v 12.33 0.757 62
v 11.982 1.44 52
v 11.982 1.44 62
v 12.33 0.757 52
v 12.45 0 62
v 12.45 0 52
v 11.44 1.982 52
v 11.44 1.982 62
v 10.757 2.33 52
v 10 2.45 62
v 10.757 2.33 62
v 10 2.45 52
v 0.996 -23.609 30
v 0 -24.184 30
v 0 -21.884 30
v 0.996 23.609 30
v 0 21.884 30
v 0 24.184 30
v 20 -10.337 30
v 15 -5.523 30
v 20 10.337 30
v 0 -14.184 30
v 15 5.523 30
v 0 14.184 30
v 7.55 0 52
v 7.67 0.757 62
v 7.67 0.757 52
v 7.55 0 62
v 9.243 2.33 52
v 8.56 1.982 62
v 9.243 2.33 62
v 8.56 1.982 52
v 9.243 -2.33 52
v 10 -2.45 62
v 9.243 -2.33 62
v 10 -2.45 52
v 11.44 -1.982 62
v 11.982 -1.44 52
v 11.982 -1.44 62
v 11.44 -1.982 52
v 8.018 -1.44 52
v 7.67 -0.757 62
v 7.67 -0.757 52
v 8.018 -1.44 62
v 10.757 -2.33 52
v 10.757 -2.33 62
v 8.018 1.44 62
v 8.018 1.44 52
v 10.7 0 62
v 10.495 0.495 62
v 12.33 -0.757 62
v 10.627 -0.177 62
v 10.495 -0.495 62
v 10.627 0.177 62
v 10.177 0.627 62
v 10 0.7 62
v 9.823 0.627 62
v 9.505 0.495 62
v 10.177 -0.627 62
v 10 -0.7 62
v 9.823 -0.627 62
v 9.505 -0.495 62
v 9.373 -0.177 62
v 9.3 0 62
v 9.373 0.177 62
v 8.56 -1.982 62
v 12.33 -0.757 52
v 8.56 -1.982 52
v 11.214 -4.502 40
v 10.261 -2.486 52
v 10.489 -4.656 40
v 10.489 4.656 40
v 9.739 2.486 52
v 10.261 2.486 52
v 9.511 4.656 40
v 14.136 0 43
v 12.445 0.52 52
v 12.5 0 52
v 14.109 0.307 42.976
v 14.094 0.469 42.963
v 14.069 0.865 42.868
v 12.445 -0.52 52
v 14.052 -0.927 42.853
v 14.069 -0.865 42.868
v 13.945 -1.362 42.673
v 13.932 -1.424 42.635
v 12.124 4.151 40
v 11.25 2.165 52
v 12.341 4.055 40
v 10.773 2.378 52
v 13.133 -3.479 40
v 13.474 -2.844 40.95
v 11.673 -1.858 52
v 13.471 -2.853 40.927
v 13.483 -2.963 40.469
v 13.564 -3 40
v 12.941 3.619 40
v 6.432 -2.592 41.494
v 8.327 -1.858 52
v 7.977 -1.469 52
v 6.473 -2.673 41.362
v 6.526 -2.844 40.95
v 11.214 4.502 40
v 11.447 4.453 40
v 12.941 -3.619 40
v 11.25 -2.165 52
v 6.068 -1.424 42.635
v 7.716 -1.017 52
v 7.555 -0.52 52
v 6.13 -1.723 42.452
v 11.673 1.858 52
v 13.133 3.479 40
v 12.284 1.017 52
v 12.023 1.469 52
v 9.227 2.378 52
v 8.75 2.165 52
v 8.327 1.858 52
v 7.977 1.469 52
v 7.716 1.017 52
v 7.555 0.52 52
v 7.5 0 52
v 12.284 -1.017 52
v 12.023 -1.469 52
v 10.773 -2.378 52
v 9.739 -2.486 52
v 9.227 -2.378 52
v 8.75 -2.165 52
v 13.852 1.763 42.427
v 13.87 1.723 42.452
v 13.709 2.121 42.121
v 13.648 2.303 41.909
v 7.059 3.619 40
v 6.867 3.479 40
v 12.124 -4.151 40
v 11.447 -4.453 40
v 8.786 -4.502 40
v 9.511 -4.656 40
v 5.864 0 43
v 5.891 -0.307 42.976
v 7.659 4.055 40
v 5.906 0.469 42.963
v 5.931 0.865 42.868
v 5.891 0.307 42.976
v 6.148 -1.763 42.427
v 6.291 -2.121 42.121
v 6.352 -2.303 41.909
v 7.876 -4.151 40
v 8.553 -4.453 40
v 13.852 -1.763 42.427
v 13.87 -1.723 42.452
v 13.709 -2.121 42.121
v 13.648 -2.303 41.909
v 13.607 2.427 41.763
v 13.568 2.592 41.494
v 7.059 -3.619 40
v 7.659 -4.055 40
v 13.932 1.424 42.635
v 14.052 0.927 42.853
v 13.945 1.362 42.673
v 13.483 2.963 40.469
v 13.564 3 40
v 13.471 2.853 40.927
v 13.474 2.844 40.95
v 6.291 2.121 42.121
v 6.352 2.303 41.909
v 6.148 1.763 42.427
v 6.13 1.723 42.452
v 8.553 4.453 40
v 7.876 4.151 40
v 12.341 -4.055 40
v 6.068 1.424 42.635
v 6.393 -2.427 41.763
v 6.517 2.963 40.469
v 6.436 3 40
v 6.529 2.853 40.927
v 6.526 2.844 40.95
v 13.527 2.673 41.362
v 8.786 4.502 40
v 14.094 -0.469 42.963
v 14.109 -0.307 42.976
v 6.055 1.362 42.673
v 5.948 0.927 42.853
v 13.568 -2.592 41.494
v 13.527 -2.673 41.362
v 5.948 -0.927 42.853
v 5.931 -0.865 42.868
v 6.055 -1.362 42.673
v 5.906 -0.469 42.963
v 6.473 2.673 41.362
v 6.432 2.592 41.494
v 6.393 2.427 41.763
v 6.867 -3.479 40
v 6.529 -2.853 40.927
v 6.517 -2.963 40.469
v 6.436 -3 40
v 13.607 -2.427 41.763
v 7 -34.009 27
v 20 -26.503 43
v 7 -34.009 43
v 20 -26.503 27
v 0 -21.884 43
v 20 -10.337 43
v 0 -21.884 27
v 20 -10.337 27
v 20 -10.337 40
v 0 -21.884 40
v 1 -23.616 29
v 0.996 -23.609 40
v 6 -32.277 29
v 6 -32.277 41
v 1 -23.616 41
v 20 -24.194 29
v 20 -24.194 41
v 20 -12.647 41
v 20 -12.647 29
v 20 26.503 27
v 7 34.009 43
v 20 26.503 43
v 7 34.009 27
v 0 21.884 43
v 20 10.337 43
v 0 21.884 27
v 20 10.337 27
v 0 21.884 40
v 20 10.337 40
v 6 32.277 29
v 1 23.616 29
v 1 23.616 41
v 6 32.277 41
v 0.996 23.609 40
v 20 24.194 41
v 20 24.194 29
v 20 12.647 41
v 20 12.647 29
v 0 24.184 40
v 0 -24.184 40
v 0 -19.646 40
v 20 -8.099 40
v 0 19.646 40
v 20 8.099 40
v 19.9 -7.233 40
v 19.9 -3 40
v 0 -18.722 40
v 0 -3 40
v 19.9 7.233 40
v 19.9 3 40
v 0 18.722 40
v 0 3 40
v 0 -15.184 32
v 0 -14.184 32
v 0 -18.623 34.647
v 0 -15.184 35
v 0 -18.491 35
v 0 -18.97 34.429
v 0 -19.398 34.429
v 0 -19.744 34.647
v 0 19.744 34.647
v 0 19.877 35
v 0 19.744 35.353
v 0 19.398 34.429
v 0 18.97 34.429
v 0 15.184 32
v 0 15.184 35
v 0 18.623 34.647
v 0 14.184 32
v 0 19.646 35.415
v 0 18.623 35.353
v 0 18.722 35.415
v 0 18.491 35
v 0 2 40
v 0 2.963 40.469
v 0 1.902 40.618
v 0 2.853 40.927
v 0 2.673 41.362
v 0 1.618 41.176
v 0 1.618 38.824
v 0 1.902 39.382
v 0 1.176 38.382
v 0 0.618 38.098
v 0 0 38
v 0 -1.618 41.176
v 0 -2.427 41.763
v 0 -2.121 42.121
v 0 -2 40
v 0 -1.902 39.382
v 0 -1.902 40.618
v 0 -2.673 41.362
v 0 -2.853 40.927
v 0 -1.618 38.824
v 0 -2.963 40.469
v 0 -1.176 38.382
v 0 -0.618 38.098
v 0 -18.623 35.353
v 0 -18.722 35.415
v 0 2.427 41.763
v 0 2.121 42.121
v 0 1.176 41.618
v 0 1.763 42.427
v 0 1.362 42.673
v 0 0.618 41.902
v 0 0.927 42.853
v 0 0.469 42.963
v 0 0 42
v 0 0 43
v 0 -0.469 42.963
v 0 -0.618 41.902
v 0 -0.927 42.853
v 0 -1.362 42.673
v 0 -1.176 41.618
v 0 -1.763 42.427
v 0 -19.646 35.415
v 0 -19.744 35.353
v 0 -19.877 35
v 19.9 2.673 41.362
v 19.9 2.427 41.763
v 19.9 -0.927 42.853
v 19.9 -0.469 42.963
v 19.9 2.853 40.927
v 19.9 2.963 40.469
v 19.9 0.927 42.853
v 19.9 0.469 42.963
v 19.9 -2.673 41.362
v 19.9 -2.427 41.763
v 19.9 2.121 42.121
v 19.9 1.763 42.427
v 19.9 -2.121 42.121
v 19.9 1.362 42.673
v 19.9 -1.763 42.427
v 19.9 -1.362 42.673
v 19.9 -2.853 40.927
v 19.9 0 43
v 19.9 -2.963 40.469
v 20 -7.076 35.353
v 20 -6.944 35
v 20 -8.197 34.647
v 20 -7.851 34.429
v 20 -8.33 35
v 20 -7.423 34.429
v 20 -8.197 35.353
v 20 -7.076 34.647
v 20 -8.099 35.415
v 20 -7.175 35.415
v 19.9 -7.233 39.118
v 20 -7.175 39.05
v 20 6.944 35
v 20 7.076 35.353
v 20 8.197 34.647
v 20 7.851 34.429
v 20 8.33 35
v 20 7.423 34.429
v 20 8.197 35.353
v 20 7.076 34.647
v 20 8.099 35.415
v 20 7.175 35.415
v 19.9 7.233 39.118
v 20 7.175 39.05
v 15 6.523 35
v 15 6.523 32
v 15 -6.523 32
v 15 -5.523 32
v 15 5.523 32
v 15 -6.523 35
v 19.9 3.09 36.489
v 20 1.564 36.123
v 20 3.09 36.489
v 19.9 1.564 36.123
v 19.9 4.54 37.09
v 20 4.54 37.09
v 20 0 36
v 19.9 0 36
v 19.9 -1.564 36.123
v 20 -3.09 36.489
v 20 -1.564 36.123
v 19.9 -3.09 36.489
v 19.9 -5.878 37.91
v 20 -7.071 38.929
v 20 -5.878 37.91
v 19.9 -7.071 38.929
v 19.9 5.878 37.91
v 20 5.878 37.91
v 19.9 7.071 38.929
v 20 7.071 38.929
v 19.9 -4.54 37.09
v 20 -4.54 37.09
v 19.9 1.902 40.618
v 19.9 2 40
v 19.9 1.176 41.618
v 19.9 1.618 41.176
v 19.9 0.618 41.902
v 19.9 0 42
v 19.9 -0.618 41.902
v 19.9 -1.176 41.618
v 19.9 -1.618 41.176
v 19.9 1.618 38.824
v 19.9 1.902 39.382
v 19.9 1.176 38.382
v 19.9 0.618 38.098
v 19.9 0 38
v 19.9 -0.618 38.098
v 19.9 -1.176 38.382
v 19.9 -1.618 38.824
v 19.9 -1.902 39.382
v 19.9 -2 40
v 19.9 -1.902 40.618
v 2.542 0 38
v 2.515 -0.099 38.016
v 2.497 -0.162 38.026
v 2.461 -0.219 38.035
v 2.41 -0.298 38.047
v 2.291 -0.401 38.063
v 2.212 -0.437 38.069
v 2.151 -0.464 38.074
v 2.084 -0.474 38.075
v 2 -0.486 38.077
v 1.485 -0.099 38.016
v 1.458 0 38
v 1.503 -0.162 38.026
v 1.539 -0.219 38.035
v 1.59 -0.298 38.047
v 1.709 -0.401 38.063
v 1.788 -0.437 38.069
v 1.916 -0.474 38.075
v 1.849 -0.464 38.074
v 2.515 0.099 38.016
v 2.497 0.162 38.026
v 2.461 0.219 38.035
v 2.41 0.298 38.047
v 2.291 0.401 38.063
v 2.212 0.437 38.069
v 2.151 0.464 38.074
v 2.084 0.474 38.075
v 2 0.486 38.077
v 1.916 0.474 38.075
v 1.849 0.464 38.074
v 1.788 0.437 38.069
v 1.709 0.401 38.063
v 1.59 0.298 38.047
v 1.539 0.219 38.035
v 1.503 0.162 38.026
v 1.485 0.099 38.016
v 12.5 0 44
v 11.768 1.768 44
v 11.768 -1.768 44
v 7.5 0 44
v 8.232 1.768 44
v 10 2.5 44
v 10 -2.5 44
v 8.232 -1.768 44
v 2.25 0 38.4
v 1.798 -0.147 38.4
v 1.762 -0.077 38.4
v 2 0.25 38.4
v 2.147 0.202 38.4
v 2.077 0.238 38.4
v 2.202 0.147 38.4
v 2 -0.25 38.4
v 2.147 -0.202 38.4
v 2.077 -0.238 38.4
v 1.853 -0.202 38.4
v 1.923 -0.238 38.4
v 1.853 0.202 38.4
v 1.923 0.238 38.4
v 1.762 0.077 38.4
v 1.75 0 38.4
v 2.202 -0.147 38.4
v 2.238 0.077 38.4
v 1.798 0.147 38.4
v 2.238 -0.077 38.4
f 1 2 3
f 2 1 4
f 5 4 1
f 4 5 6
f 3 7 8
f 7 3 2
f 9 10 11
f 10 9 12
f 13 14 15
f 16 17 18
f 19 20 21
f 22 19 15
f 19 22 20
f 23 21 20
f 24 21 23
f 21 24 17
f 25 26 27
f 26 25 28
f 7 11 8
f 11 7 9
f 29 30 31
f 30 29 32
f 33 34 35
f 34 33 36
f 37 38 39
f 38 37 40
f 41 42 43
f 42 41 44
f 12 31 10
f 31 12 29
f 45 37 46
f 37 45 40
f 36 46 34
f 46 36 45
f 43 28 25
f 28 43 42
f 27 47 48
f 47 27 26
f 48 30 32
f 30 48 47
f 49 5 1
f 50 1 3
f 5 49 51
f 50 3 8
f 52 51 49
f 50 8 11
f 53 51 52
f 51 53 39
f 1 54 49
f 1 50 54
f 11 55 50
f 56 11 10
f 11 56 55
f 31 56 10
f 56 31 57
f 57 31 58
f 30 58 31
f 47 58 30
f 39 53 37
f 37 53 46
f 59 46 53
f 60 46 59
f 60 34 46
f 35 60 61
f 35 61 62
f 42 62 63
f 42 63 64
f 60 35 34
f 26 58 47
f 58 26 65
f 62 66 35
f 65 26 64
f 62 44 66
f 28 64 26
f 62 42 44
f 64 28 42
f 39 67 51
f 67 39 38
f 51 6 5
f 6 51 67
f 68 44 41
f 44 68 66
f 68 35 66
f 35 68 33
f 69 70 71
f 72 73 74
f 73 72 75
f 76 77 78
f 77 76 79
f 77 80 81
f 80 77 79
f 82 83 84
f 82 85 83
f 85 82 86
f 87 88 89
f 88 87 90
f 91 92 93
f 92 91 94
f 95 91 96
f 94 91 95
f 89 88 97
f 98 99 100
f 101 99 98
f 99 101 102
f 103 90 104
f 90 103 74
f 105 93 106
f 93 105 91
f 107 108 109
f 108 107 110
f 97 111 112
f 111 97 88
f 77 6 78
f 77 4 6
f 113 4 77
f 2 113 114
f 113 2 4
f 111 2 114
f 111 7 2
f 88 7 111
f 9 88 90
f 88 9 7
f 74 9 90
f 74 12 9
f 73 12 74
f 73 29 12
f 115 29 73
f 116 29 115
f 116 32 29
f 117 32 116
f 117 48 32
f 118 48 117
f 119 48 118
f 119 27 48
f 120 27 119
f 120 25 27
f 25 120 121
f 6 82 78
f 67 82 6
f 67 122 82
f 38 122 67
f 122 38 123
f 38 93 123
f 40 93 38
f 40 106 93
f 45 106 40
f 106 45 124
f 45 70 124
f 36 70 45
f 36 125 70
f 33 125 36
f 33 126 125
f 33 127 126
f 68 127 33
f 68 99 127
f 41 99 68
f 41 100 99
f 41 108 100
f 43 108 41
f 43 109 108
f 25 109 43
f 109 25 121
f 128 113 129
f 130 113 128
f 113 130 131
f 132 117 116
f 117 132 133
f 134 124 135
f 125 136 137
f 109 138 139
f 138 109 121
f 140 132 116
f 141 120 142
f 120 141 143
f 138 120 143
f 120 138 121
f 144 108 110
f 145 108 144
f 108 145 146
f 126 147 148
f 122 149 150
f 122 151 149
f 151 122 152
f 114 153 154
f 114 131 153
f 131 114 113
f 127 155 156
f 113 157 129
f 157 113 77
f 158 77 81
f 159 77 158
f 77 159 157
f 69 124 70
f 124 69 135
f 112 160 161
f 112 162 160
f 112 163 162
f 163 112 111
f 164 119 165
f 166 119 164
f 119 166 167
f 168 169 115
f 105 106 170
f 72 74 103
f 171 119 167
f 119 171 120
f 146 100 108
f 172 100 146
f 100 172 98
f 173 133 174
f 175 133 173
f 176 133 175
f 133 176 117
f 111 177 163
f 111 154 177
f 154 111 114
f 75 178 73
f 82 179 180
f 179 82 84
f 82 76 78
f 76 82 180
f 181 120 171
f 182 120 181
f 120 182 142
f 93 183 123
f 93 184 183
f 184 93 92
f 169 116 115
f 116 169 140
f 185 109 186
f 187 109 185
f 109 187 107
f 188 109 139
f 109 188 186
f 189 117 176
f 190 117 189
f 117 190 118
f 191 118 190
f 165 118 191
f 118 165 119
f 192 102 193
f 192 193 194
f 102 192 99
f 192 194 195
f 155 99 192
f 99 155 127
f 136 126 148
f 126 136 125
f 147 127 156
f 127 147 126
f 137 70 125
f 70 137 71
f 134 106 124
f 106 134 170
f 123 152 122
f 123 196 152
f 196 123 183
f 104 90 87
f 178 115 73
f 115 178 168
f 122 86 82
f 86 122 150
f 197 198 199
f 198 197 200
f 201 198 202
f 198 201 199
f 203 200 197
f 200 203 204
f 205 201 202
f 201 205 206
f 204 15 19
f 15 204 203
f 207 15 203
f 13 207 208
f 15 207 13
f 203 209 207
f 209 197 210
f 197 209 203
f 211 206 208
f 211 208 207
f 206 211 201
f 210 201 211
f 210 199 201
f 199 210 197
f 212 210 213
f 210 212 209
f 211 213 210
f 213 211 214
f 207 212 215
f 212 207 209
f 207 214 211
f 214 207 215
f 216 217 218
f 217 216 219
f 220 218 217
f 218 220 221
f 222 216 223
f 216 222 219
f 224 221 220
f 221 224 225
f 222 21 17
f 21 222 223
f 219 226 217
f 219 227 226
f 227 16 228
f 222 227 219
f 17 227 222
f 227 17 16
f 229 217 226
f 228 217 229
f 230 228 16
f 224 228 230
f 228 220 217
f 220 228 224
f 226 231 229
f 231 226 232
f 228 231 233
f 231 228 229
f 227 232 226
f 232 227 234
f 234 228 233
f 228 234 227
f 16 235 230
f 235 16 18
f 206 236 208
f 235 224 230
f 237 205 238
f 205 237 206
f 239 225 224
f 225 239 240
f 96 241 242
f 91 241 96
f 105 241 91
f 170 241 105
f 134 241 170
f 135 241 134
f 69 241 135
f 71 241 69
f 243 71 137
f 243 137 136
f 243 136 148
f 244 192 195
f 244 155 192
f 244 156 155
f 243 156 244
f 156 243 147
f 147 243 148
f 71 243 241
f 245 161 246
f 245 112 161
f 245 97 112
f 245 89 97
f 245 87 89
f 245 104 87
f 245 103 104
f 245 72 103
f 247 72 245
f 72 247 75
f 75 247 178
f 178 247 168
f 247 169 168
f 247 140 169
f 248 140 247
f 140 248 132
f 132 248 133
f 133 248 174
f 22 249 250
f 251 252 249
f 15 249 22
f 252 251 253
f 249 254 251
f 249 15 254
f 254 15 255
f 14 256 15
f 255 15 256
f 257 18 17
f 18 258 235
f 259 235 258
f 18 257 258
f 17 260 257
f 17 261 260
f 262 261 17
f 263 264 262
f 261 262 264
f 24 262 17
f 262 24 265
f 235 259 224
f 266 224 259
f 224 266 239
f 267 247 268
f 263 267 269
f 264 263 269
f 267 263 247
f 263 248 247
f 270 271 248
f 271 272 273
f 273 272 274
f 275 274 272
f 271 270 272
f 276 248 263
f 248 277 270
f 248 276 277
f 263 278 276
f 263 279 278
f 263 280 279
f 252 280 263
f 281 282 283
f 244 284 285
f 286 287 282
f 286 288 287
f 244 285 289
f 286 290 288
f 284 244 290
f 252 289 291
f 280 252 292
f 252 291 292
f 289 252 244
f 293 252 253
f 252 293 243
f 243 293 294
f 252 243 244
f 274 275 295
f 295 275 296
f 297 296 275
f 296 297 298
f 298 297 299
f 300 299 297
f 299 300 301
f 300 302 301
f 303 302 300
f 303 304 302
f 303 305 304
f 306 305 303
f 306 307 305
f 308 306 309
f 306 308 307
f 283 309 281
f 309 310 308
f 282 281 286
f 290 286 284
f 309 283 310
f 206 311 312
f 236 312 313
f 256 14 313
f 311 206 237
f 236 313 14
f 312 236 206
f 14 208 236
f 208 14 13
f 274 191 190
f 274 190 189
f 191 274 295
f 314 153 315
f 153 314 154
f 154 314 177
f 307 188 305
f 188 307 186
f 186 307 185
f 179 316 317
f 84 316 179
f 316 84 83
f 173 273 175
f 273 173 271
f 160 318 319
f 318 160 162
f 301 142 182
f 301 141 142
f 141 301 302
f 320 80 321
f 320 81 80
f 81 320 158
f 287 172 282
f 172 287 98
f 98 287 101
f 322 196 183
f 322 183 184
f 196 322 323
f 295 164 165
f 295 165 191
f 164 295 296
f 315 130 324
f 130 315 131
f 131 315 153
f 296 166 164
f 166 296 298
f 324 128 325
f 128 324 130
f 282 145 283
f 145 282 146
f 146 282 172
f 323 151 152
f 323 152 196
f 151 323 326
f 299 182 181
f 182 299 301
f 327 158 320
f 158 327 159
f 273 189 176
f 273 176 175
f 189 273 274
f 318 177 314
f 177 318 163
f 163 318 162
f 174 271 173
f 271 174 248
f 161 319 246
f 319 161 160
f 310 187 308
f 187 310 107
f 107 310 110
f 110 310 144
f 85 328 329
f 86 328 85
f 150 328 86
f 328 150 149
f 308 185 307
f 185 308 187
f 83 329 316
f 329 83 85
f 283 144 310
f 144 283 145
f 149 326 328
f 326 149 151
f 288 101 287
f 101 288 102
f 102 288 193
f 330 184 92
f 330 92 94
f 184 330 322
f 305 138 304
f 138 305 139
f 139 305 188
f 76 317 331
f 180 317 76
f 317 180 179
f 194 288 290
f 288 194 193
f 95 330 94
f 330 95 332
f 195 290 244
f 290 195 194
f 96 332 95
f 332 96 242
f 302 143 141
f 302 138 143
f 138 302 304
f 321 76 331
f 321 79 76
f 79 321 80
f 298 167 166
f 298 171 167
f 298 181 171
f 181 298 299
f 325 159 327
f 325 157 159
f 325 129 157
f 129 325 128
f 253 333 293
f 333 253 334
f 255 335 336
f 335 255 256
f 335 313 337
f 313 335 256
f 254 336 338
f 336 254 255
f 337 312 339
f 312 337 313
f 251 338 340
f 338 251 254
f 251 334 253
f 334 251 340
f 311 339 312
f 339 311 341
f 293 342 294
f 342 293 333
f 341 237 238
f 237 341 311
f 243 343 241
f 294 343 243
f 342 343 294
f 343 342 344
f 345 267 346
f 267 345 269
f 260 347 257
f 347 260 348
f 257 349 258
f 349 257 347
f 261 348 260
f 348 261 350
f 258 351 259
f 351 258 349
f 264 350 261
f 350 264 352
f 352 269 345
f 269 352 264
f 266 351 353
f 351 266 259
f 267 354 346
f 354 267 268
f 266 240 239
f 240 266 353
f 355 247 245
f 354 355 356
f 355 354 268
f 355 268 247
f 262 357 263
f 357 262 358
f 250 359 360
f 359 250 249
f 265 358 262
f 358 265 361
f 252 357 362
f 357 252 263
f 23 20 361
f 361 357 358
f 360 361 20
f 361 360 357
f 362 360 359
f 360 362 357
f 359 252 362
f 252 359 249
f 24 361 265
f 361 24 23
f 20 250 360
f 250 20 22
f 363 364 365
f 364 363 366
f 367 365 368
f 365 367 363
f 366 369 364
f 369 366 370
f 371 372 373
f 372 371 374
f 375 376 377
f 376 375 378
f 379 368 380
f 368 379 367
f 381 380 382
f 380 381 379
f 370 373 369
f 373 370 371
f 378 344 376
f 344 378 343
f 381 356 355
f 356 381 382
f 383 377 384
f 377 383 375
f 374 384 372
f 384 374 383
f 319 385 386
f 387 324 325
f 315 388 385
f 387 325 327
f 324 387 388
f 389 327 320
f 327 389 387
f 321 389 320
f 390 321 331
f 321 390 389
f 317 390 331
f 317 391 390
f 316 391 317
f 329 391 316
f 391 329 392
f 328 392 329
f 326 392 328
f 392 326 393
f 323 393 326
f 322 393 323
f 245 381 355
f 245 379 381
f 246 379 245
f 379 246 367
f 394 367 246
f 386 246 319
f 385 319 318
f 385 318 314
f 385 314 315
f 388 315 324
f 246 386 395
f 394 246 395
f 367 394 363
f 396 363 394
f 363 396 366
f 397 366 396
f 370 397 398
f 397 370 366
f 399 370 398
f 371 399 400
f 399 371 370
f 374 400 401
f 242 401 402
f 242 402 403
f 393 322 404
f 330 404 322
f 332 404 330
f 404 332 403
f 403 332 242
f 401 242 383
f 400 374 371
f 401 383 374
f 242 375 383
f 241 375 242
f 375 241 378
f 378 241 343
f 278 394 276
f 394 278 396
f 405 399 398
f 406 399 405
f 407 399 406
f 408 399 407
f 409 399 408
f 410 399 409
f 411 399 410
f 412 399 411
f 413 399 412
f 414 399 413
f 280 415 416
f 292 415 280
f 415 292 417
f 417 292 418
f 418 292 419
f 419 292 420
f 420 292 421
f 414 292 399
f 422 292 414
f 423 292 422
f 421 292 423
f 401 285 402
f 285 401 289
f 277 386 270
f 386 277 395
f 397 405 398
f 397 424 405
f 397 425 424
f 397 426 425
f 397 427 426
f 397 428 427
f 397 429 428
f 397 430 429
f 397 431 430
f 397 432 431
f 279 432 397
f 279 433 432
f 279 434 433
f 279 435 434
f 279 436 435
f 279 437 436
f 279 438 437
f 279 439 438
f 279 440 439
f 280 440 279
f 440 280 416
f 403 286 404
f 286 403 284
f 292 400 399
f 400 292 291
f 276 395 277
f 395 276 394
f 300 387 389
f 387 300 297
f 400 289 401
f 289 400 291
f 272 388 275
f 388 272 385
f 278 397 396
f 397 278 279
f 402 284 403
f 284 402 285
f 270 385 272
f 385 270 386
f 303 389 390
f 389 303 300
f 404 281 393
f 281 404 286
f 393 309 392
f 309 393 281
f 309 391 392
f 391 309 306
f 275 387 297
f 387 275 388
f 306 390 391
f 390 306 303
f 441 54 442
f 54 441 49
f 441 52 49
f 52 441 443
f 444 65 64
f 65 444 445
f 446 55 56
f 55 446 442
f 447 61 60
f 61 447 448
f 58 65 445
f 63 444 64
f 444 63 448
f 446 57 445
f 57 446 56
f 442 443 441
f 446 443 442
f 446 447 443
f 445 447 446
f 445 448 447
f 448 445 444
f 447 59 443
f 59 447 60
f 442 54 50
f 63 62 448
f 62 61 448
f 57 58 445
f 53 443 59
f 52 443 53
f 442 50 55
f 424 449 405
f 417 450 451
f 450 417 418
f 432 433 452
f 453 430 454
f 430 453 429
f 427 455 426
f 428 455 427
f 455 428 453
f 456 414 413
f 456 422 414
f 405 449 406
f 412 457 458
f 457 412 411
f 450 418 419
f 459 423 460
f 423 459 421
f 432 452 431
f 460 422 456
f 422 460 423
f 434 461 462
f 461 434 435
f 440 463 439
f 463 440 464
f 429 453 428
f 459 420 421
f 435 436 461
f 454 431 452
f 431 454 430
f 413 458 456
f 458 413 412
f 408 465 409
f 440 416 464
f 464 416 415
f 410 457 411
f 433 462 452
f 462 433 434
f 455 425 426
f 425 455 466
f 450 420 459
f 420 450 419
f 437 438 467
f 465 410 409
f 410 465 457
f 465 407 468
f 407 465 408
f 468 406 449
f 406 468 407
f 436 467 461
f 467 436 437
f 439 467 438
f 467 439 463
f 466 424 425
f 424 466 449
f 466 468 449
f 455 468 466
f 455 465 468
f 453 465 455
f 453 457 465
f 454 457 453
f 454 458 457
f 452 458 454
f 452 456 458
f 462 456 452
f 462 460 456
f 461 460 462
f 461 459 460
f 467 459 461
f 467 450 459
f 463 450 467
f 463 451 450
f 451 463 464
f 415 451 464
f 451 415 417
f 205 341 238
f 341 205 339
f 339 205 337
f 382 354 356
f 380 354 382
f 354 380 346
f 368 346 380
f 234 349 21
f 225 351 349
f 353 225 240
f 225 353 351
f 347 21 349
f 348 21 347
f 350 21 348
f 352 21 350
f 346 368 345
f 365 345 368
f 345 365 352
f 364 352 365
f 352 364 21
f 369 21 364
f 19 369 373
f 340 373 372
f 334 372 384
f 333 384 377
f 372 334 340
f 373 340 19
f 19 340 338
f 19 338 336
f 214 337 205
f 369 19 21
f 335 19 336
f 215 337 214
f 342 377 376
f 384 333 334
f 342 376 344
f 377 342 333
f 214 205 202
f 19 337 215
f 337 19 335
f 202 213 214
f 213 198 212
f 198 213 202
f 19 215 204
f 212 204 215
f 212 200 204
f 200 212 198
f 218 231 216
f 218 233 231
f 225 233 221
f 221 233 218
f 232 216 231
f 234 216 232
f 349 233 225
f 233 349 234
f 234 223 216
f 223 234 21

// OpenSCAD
module slidingSlot(){
	difference(){
		rotate_extrude(){
			translate([40,0,0])
			polygon(points=[[0,0],[16,0],[16,10],[11,10],[11,7],[13,4],[13,3],[3,3],[3,4],[5,7],[5,10],[0,10]]);
		}
		translate([0,0,-5])
		linear_extrude(height=20)
		polygon(points=[[60,60],[-60,60],[0,0],[-60,-60],[60,-60]]);
	}
}

module needleSlot(xx,yy,zz){
	l=55;
	translate([xx-(l-5)*cos(30)+25,yy-sin(30)*l-2.25,zz+5])
		rotate([-90,0,-60]){
			cylinder(d=1.2,h=l,$fn=10);
			translate([-0.4,-10,0])
				cube([0.8,10,l]);
	}
}

module sideMotorMount(xx,yy,zz,wideY){
	translate([xx,-wideY+(2/cos(30))-0.01,zz-3])
		rotate([0,0,-60]){
		difference(){
			cube([14,24,16]);
			translate([2,-5,2])
			cube([10,30,12]);
		}
	}
}

module signature(){
	translate([17,6,39.5])
	rotate([0,0,150])
	scale([2,2,1])
	linear_extrude(height=2)
		import(file="sig.dxf");
}


module waterNeedleHolder(xx,yy,zz){
	narrowY=2.25+sin(30)*5+5;
	wideY=narrowY+tan(30)*25;
	
	difference(){
		union(){

			//Top Scaffold Adaptor
			translate([10,0,zz]){
				cylinder(d=4.9,h=32,$fn=20);
				cylinder(d1=13,d2=5,h=22, $fn=30);
			}
		
			//Base
			translate([xx,yy,zz])
			linear_extrude(height=10)
			polygon(points=[[25,narrowY],[25,-narrowY],[0,-wideY],[0,wideY]]);

			//Odor Tube
			translate([xx,yy,zz+10])
			rotate([0,90,0])	
			cylinder(h=20,d=6,$fn=40);
			
			sideMotorMount(xx,yy,zz,wideY);
			mirror([0,1,0])
				sideMotorMount(xx,yy,zz,wideY);

		}

		signature();
		
		//Bottom Slot
		translate([xx,yy,zz+2])
		linear_extrude(height=3)
		polygon(points=[[15,tan(30)*10+narrowY-9],[15,-tan(30)*10-narrowY+9],[0,-wideY+9],[0,wideY-9]]);
		
		//Bottom Groove
		translate([xx,yy,zz-5])
		linear_extrude(height=10)
		polygon(points=[[15,tan(30)*10+narrowY-10],[15,-tan(30)*10-narrowY+10],[0,-wideY+10],[0,wideY-10]]);

		
		//Nose Groove
		translate([xx+19.9,yy,zz+16])
		rotate([0,90,0])
		cylinder(h=20,d=20,$fn=40);
		
		
		//Odor Tube
		translate([xx-15,yy,zz+10])
		rotate([0,90,0])
		cylinder(h=60,d=4,$fn=20);

		needleSlot(xx,yy,zz);
		mirror([0,1,0]) needleSlot(xx,yy,zz);
		
		//hole in adaptor
		translate([10,0,zz+14])
		cylinder(h=20,d1=5,d2=1);
		
	}
	
	//Odor Tube Fixer
	translate([2,0,zz+6]){
		cylinder(d1=4,d2=0.5,h=2.4,$fn=20);
	}
}

// module measureCube(){
	// translate([29,-2.25,0])
	// cube([20,4.5,4.5]);
// }


// module functionColumn(){
	
// }

module mousePlatform(){
	translate([0,-100,0])
	color("grey",1.0){
		cube([200,200,10]);
		translate([60,50,0])
		cube([20,100,20]);
	}
	translate([50,0,37.5])
	rotate([0,90,0])
	{
		difference(){	
			difference(){
				color("white",0.7){
					cylinder(d=45,h=150);
				}
				translate([0,0,-10])
				cylinder(d=35,h=170);
			}
			translate([-30,-50,-10])
			cube([20,100,170]);
		}
	}
}


// mousePlatform();
// translate([70,0,20])
// slidingSlot();
if (1) difference(){
	waterNeedleHolder(0,0,30);
	translate([20,-50,0])cube([100,100,100]);
}else difference(){
	waterNeedleHolder(0,0,30);
	translate([-80,-50,0])cube([100,100,100]);
}
// signature();

//measureCube();
